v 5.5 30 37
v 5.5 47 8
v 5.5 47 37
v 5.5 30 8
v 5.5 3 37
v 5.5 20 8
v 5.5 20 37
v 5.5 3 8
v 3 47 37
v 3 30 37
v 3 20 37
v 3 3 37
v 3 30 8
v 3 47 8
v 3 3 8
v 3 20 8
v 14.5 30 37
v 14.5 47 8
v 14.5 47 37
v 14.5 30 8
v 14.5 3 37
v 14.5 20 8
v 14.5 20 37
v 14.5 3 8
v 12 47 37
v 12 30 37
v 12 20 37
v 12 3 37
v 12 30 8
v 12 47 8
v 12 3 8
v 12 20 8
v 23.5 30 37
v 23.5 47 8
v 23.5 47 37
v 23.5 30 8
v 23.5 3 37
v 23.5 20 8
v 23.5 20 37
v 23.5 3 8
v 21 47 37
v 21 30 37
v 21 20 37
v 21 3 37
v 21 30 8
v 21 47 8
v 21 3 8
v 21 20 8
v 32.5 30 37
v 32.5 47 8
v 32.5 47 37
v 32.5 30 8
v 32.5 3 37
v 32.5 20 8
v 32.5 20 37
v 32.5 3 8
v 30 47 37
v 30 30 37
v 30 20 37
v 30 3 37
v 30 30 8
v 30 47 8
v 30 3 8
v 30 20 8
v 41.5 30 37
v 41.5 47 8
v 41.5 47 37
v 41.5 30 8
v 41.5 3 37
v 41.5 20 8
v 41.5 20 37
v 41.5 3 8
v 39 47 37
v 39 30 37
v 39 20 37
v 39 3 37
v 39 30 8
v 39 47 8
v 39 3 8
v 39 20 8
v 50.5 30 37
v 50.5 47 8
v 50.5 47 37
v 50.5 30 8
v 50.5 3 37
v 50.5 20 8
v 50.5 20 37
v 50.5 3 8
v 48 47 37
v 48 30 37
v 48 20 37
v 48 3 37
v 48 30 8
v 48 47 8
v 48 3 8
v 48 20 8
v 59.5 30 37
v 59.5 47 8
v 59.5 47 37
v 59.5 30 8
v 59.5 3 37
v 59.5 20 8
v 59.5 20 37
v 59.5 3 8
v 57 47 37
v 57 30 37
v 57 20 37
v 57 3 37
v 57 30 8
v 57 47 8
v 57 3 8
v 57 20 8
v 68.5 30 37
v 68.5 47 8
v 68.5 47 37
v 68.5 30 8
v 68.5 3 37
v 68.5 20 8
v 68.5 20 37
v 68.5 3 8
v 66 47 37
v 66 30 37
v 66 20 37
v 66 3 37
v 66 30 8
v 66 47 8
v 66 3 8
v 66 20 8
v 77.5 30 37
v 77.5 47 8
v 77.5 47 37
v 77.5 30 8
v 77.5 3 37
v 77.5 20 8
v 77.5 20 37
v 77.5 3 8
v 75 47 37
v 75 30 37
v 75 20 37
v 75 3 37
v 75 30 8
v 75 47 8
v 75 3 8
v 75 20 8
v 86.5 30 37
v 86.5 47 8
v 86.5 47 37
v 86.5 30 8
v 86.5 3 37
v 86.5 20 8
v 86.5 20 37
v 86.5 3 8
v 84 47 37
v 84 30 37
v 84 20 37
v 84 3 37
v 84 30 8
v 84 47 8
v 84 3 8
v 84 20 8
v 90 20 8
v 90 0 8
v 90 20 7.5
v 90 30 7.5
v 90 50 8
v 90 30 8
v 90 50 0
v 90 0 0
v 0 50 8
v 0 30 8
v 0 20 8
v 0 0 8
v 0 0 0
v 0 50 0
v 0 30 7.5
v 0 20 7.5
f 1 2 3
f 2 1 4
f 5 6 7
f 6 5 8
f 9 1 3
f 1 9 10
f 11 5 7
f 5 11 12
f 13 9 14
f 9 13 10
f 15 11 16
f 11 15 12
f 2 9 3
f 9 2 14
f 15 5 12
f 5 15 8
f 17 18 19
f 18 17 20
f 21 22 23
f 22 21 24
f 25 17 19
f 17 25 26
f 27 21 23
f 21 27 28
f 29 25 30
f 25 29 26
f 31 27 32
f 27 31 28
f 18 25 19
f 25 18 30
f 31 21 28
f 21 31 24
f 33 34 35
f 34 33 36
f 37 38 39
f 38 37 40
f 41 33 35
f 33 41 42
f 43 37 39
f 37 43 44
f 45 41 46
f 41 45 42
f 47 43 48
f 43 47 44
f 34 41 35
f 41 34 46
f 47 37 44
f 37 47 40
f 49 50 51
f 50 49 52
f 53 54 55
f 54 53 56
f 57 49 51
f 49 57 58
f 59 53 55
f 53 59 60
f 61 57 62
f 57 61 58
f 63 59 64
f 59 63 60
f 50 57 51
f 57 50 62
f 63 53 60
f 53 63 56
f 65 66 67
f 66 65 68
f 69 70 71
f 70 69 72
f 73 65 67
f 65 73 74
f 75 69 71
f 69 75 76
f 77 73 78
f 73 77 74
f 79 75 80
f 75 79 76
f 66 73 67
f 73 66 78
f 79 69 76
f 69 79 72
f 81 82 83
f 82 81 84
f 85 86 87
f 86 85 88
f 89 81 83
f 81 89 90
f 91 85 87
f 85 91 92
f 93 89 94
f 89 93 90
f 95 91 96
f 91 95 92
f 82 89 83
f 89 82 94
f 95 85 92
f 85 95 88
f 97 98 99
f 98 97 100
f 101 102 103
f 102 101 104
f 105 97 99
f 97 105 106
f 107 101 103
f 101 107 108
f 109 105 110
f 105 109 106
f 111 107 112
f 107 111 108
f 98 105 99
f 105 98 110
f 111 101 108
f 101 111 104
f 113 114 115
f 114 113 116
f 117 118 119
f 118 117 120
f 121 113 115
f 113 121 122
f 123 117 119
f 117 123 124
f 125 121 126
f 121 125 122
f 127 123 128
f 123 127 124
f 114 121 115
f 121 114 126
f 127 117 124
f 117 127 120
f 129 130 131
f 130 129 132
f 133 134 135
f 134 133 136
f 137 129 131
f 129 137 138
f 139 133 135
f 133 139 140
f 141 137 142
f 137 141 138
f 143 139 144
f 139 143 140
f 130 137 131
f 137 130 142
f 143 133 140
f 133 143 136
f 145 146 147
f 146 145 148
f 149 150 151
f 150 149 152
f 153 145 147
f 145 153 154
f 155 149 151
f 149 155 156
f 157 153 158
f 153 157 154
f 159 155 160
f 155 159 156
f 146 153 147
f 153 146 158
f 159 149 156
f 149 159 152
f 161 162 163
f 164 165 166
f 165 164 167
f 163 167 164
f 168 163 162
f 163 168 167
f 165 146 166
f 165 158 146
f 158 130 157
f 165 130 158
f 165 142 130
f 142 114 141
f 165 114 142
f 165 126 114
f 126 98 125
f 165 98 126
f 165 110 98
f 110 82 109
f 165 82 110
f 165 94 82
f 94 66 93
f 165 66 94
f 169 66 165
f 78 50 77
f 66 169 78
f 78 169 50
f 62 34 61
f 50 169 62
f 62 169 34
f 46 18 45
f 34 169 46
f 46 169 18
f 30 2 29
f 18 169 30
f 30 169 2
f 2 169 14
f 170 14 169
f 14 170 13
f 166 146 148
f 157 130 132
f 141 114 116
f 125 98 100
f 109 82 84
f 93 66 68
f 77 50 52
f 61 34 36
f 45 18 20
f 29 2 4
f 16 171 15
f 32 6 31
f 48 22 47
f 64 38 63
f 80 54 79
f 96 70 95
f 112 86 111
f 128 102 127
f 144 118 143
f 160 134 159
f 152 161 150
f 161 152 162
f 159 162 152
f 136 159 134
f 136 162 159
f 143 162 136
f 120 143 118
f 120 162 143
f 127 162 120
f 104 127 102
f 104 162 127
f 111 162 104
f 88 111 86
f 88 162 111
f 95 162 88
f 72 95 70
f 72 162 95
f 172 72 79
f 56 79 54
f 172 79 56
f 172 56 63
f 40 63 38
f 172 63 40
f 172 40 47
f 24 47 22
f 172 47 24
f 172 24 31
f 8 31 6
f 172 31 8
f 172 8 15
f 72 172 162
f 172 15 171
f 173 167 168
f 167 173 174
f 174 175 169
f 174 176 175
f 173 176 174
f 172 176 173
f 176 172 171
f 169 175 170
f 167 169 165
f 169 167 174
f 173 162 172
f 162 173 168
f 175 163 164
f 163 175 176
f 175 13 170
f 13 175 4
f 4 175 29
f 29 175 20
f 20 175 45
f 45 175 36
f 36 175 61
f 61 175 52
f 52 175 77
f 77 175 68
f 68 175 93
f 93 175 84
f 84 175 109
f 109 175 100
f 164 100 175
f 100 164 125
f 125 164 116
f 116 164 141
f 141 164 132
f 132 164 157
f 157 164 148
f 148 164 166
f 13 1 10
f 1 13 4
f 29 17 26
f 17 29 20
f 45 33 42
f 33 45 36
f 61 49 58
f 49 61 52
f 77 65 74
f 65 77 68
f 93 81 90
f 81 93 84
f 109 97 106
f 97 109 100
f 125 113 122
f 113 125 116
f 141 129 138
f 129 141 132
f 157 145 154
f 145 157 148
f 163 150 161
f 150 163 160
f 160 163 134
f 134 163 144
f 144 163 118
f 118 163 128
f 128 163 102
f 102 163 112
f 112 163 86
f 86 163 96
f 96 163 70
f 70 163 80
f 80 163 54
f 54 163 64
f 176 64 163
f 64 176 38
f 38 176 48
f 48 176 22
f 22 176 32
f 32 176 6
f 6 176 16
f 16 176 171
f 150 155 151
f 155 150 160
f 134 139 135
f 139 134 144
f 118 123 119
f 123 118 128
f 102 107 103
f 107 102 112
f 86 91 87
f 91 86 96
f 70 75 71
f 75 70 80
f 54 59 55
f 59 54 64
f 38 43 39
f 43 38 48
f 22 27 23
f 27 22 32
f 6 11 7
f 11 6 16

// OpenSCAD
$fn = 32;

// ----------------------------------------------------------------------
// Heatsink: slotted fin block
// ----------------------------------------------------------------------

// --- parameters (mm) ---
base_l = 90;              // base length, X
base_w = 50;              // base width, Y
base_t = 8;               // base plate thickness
fin_h = 30;               // fin height above the base
fin_t = 2.5;              // fin thickness
edge = 3;                 // margin from the base ends
pitch = 9;                // fin pitch
slot_w = 10;              // central slot width, Y

n_fins = floor((base_l - 2 * edge - fin_t) / pitch) + 1;  // fin count
total_h = base_t + fin_h - 1;  // overall height

difference() {
union() {
  cube([base_l, base_w, base_t]);
  for (i = [0 : n_fins - 1])
    translate([edge + i * pitch, edge, base_t - 1])
      cube([fin_t, base_w - 2 * edge, fin_h]);
}
  translate([-1, base_w / 2 - slot_w / 2, base_t - 0.5])
    cube([base_l + 2, slot_w, fin_h + 2]);
}
